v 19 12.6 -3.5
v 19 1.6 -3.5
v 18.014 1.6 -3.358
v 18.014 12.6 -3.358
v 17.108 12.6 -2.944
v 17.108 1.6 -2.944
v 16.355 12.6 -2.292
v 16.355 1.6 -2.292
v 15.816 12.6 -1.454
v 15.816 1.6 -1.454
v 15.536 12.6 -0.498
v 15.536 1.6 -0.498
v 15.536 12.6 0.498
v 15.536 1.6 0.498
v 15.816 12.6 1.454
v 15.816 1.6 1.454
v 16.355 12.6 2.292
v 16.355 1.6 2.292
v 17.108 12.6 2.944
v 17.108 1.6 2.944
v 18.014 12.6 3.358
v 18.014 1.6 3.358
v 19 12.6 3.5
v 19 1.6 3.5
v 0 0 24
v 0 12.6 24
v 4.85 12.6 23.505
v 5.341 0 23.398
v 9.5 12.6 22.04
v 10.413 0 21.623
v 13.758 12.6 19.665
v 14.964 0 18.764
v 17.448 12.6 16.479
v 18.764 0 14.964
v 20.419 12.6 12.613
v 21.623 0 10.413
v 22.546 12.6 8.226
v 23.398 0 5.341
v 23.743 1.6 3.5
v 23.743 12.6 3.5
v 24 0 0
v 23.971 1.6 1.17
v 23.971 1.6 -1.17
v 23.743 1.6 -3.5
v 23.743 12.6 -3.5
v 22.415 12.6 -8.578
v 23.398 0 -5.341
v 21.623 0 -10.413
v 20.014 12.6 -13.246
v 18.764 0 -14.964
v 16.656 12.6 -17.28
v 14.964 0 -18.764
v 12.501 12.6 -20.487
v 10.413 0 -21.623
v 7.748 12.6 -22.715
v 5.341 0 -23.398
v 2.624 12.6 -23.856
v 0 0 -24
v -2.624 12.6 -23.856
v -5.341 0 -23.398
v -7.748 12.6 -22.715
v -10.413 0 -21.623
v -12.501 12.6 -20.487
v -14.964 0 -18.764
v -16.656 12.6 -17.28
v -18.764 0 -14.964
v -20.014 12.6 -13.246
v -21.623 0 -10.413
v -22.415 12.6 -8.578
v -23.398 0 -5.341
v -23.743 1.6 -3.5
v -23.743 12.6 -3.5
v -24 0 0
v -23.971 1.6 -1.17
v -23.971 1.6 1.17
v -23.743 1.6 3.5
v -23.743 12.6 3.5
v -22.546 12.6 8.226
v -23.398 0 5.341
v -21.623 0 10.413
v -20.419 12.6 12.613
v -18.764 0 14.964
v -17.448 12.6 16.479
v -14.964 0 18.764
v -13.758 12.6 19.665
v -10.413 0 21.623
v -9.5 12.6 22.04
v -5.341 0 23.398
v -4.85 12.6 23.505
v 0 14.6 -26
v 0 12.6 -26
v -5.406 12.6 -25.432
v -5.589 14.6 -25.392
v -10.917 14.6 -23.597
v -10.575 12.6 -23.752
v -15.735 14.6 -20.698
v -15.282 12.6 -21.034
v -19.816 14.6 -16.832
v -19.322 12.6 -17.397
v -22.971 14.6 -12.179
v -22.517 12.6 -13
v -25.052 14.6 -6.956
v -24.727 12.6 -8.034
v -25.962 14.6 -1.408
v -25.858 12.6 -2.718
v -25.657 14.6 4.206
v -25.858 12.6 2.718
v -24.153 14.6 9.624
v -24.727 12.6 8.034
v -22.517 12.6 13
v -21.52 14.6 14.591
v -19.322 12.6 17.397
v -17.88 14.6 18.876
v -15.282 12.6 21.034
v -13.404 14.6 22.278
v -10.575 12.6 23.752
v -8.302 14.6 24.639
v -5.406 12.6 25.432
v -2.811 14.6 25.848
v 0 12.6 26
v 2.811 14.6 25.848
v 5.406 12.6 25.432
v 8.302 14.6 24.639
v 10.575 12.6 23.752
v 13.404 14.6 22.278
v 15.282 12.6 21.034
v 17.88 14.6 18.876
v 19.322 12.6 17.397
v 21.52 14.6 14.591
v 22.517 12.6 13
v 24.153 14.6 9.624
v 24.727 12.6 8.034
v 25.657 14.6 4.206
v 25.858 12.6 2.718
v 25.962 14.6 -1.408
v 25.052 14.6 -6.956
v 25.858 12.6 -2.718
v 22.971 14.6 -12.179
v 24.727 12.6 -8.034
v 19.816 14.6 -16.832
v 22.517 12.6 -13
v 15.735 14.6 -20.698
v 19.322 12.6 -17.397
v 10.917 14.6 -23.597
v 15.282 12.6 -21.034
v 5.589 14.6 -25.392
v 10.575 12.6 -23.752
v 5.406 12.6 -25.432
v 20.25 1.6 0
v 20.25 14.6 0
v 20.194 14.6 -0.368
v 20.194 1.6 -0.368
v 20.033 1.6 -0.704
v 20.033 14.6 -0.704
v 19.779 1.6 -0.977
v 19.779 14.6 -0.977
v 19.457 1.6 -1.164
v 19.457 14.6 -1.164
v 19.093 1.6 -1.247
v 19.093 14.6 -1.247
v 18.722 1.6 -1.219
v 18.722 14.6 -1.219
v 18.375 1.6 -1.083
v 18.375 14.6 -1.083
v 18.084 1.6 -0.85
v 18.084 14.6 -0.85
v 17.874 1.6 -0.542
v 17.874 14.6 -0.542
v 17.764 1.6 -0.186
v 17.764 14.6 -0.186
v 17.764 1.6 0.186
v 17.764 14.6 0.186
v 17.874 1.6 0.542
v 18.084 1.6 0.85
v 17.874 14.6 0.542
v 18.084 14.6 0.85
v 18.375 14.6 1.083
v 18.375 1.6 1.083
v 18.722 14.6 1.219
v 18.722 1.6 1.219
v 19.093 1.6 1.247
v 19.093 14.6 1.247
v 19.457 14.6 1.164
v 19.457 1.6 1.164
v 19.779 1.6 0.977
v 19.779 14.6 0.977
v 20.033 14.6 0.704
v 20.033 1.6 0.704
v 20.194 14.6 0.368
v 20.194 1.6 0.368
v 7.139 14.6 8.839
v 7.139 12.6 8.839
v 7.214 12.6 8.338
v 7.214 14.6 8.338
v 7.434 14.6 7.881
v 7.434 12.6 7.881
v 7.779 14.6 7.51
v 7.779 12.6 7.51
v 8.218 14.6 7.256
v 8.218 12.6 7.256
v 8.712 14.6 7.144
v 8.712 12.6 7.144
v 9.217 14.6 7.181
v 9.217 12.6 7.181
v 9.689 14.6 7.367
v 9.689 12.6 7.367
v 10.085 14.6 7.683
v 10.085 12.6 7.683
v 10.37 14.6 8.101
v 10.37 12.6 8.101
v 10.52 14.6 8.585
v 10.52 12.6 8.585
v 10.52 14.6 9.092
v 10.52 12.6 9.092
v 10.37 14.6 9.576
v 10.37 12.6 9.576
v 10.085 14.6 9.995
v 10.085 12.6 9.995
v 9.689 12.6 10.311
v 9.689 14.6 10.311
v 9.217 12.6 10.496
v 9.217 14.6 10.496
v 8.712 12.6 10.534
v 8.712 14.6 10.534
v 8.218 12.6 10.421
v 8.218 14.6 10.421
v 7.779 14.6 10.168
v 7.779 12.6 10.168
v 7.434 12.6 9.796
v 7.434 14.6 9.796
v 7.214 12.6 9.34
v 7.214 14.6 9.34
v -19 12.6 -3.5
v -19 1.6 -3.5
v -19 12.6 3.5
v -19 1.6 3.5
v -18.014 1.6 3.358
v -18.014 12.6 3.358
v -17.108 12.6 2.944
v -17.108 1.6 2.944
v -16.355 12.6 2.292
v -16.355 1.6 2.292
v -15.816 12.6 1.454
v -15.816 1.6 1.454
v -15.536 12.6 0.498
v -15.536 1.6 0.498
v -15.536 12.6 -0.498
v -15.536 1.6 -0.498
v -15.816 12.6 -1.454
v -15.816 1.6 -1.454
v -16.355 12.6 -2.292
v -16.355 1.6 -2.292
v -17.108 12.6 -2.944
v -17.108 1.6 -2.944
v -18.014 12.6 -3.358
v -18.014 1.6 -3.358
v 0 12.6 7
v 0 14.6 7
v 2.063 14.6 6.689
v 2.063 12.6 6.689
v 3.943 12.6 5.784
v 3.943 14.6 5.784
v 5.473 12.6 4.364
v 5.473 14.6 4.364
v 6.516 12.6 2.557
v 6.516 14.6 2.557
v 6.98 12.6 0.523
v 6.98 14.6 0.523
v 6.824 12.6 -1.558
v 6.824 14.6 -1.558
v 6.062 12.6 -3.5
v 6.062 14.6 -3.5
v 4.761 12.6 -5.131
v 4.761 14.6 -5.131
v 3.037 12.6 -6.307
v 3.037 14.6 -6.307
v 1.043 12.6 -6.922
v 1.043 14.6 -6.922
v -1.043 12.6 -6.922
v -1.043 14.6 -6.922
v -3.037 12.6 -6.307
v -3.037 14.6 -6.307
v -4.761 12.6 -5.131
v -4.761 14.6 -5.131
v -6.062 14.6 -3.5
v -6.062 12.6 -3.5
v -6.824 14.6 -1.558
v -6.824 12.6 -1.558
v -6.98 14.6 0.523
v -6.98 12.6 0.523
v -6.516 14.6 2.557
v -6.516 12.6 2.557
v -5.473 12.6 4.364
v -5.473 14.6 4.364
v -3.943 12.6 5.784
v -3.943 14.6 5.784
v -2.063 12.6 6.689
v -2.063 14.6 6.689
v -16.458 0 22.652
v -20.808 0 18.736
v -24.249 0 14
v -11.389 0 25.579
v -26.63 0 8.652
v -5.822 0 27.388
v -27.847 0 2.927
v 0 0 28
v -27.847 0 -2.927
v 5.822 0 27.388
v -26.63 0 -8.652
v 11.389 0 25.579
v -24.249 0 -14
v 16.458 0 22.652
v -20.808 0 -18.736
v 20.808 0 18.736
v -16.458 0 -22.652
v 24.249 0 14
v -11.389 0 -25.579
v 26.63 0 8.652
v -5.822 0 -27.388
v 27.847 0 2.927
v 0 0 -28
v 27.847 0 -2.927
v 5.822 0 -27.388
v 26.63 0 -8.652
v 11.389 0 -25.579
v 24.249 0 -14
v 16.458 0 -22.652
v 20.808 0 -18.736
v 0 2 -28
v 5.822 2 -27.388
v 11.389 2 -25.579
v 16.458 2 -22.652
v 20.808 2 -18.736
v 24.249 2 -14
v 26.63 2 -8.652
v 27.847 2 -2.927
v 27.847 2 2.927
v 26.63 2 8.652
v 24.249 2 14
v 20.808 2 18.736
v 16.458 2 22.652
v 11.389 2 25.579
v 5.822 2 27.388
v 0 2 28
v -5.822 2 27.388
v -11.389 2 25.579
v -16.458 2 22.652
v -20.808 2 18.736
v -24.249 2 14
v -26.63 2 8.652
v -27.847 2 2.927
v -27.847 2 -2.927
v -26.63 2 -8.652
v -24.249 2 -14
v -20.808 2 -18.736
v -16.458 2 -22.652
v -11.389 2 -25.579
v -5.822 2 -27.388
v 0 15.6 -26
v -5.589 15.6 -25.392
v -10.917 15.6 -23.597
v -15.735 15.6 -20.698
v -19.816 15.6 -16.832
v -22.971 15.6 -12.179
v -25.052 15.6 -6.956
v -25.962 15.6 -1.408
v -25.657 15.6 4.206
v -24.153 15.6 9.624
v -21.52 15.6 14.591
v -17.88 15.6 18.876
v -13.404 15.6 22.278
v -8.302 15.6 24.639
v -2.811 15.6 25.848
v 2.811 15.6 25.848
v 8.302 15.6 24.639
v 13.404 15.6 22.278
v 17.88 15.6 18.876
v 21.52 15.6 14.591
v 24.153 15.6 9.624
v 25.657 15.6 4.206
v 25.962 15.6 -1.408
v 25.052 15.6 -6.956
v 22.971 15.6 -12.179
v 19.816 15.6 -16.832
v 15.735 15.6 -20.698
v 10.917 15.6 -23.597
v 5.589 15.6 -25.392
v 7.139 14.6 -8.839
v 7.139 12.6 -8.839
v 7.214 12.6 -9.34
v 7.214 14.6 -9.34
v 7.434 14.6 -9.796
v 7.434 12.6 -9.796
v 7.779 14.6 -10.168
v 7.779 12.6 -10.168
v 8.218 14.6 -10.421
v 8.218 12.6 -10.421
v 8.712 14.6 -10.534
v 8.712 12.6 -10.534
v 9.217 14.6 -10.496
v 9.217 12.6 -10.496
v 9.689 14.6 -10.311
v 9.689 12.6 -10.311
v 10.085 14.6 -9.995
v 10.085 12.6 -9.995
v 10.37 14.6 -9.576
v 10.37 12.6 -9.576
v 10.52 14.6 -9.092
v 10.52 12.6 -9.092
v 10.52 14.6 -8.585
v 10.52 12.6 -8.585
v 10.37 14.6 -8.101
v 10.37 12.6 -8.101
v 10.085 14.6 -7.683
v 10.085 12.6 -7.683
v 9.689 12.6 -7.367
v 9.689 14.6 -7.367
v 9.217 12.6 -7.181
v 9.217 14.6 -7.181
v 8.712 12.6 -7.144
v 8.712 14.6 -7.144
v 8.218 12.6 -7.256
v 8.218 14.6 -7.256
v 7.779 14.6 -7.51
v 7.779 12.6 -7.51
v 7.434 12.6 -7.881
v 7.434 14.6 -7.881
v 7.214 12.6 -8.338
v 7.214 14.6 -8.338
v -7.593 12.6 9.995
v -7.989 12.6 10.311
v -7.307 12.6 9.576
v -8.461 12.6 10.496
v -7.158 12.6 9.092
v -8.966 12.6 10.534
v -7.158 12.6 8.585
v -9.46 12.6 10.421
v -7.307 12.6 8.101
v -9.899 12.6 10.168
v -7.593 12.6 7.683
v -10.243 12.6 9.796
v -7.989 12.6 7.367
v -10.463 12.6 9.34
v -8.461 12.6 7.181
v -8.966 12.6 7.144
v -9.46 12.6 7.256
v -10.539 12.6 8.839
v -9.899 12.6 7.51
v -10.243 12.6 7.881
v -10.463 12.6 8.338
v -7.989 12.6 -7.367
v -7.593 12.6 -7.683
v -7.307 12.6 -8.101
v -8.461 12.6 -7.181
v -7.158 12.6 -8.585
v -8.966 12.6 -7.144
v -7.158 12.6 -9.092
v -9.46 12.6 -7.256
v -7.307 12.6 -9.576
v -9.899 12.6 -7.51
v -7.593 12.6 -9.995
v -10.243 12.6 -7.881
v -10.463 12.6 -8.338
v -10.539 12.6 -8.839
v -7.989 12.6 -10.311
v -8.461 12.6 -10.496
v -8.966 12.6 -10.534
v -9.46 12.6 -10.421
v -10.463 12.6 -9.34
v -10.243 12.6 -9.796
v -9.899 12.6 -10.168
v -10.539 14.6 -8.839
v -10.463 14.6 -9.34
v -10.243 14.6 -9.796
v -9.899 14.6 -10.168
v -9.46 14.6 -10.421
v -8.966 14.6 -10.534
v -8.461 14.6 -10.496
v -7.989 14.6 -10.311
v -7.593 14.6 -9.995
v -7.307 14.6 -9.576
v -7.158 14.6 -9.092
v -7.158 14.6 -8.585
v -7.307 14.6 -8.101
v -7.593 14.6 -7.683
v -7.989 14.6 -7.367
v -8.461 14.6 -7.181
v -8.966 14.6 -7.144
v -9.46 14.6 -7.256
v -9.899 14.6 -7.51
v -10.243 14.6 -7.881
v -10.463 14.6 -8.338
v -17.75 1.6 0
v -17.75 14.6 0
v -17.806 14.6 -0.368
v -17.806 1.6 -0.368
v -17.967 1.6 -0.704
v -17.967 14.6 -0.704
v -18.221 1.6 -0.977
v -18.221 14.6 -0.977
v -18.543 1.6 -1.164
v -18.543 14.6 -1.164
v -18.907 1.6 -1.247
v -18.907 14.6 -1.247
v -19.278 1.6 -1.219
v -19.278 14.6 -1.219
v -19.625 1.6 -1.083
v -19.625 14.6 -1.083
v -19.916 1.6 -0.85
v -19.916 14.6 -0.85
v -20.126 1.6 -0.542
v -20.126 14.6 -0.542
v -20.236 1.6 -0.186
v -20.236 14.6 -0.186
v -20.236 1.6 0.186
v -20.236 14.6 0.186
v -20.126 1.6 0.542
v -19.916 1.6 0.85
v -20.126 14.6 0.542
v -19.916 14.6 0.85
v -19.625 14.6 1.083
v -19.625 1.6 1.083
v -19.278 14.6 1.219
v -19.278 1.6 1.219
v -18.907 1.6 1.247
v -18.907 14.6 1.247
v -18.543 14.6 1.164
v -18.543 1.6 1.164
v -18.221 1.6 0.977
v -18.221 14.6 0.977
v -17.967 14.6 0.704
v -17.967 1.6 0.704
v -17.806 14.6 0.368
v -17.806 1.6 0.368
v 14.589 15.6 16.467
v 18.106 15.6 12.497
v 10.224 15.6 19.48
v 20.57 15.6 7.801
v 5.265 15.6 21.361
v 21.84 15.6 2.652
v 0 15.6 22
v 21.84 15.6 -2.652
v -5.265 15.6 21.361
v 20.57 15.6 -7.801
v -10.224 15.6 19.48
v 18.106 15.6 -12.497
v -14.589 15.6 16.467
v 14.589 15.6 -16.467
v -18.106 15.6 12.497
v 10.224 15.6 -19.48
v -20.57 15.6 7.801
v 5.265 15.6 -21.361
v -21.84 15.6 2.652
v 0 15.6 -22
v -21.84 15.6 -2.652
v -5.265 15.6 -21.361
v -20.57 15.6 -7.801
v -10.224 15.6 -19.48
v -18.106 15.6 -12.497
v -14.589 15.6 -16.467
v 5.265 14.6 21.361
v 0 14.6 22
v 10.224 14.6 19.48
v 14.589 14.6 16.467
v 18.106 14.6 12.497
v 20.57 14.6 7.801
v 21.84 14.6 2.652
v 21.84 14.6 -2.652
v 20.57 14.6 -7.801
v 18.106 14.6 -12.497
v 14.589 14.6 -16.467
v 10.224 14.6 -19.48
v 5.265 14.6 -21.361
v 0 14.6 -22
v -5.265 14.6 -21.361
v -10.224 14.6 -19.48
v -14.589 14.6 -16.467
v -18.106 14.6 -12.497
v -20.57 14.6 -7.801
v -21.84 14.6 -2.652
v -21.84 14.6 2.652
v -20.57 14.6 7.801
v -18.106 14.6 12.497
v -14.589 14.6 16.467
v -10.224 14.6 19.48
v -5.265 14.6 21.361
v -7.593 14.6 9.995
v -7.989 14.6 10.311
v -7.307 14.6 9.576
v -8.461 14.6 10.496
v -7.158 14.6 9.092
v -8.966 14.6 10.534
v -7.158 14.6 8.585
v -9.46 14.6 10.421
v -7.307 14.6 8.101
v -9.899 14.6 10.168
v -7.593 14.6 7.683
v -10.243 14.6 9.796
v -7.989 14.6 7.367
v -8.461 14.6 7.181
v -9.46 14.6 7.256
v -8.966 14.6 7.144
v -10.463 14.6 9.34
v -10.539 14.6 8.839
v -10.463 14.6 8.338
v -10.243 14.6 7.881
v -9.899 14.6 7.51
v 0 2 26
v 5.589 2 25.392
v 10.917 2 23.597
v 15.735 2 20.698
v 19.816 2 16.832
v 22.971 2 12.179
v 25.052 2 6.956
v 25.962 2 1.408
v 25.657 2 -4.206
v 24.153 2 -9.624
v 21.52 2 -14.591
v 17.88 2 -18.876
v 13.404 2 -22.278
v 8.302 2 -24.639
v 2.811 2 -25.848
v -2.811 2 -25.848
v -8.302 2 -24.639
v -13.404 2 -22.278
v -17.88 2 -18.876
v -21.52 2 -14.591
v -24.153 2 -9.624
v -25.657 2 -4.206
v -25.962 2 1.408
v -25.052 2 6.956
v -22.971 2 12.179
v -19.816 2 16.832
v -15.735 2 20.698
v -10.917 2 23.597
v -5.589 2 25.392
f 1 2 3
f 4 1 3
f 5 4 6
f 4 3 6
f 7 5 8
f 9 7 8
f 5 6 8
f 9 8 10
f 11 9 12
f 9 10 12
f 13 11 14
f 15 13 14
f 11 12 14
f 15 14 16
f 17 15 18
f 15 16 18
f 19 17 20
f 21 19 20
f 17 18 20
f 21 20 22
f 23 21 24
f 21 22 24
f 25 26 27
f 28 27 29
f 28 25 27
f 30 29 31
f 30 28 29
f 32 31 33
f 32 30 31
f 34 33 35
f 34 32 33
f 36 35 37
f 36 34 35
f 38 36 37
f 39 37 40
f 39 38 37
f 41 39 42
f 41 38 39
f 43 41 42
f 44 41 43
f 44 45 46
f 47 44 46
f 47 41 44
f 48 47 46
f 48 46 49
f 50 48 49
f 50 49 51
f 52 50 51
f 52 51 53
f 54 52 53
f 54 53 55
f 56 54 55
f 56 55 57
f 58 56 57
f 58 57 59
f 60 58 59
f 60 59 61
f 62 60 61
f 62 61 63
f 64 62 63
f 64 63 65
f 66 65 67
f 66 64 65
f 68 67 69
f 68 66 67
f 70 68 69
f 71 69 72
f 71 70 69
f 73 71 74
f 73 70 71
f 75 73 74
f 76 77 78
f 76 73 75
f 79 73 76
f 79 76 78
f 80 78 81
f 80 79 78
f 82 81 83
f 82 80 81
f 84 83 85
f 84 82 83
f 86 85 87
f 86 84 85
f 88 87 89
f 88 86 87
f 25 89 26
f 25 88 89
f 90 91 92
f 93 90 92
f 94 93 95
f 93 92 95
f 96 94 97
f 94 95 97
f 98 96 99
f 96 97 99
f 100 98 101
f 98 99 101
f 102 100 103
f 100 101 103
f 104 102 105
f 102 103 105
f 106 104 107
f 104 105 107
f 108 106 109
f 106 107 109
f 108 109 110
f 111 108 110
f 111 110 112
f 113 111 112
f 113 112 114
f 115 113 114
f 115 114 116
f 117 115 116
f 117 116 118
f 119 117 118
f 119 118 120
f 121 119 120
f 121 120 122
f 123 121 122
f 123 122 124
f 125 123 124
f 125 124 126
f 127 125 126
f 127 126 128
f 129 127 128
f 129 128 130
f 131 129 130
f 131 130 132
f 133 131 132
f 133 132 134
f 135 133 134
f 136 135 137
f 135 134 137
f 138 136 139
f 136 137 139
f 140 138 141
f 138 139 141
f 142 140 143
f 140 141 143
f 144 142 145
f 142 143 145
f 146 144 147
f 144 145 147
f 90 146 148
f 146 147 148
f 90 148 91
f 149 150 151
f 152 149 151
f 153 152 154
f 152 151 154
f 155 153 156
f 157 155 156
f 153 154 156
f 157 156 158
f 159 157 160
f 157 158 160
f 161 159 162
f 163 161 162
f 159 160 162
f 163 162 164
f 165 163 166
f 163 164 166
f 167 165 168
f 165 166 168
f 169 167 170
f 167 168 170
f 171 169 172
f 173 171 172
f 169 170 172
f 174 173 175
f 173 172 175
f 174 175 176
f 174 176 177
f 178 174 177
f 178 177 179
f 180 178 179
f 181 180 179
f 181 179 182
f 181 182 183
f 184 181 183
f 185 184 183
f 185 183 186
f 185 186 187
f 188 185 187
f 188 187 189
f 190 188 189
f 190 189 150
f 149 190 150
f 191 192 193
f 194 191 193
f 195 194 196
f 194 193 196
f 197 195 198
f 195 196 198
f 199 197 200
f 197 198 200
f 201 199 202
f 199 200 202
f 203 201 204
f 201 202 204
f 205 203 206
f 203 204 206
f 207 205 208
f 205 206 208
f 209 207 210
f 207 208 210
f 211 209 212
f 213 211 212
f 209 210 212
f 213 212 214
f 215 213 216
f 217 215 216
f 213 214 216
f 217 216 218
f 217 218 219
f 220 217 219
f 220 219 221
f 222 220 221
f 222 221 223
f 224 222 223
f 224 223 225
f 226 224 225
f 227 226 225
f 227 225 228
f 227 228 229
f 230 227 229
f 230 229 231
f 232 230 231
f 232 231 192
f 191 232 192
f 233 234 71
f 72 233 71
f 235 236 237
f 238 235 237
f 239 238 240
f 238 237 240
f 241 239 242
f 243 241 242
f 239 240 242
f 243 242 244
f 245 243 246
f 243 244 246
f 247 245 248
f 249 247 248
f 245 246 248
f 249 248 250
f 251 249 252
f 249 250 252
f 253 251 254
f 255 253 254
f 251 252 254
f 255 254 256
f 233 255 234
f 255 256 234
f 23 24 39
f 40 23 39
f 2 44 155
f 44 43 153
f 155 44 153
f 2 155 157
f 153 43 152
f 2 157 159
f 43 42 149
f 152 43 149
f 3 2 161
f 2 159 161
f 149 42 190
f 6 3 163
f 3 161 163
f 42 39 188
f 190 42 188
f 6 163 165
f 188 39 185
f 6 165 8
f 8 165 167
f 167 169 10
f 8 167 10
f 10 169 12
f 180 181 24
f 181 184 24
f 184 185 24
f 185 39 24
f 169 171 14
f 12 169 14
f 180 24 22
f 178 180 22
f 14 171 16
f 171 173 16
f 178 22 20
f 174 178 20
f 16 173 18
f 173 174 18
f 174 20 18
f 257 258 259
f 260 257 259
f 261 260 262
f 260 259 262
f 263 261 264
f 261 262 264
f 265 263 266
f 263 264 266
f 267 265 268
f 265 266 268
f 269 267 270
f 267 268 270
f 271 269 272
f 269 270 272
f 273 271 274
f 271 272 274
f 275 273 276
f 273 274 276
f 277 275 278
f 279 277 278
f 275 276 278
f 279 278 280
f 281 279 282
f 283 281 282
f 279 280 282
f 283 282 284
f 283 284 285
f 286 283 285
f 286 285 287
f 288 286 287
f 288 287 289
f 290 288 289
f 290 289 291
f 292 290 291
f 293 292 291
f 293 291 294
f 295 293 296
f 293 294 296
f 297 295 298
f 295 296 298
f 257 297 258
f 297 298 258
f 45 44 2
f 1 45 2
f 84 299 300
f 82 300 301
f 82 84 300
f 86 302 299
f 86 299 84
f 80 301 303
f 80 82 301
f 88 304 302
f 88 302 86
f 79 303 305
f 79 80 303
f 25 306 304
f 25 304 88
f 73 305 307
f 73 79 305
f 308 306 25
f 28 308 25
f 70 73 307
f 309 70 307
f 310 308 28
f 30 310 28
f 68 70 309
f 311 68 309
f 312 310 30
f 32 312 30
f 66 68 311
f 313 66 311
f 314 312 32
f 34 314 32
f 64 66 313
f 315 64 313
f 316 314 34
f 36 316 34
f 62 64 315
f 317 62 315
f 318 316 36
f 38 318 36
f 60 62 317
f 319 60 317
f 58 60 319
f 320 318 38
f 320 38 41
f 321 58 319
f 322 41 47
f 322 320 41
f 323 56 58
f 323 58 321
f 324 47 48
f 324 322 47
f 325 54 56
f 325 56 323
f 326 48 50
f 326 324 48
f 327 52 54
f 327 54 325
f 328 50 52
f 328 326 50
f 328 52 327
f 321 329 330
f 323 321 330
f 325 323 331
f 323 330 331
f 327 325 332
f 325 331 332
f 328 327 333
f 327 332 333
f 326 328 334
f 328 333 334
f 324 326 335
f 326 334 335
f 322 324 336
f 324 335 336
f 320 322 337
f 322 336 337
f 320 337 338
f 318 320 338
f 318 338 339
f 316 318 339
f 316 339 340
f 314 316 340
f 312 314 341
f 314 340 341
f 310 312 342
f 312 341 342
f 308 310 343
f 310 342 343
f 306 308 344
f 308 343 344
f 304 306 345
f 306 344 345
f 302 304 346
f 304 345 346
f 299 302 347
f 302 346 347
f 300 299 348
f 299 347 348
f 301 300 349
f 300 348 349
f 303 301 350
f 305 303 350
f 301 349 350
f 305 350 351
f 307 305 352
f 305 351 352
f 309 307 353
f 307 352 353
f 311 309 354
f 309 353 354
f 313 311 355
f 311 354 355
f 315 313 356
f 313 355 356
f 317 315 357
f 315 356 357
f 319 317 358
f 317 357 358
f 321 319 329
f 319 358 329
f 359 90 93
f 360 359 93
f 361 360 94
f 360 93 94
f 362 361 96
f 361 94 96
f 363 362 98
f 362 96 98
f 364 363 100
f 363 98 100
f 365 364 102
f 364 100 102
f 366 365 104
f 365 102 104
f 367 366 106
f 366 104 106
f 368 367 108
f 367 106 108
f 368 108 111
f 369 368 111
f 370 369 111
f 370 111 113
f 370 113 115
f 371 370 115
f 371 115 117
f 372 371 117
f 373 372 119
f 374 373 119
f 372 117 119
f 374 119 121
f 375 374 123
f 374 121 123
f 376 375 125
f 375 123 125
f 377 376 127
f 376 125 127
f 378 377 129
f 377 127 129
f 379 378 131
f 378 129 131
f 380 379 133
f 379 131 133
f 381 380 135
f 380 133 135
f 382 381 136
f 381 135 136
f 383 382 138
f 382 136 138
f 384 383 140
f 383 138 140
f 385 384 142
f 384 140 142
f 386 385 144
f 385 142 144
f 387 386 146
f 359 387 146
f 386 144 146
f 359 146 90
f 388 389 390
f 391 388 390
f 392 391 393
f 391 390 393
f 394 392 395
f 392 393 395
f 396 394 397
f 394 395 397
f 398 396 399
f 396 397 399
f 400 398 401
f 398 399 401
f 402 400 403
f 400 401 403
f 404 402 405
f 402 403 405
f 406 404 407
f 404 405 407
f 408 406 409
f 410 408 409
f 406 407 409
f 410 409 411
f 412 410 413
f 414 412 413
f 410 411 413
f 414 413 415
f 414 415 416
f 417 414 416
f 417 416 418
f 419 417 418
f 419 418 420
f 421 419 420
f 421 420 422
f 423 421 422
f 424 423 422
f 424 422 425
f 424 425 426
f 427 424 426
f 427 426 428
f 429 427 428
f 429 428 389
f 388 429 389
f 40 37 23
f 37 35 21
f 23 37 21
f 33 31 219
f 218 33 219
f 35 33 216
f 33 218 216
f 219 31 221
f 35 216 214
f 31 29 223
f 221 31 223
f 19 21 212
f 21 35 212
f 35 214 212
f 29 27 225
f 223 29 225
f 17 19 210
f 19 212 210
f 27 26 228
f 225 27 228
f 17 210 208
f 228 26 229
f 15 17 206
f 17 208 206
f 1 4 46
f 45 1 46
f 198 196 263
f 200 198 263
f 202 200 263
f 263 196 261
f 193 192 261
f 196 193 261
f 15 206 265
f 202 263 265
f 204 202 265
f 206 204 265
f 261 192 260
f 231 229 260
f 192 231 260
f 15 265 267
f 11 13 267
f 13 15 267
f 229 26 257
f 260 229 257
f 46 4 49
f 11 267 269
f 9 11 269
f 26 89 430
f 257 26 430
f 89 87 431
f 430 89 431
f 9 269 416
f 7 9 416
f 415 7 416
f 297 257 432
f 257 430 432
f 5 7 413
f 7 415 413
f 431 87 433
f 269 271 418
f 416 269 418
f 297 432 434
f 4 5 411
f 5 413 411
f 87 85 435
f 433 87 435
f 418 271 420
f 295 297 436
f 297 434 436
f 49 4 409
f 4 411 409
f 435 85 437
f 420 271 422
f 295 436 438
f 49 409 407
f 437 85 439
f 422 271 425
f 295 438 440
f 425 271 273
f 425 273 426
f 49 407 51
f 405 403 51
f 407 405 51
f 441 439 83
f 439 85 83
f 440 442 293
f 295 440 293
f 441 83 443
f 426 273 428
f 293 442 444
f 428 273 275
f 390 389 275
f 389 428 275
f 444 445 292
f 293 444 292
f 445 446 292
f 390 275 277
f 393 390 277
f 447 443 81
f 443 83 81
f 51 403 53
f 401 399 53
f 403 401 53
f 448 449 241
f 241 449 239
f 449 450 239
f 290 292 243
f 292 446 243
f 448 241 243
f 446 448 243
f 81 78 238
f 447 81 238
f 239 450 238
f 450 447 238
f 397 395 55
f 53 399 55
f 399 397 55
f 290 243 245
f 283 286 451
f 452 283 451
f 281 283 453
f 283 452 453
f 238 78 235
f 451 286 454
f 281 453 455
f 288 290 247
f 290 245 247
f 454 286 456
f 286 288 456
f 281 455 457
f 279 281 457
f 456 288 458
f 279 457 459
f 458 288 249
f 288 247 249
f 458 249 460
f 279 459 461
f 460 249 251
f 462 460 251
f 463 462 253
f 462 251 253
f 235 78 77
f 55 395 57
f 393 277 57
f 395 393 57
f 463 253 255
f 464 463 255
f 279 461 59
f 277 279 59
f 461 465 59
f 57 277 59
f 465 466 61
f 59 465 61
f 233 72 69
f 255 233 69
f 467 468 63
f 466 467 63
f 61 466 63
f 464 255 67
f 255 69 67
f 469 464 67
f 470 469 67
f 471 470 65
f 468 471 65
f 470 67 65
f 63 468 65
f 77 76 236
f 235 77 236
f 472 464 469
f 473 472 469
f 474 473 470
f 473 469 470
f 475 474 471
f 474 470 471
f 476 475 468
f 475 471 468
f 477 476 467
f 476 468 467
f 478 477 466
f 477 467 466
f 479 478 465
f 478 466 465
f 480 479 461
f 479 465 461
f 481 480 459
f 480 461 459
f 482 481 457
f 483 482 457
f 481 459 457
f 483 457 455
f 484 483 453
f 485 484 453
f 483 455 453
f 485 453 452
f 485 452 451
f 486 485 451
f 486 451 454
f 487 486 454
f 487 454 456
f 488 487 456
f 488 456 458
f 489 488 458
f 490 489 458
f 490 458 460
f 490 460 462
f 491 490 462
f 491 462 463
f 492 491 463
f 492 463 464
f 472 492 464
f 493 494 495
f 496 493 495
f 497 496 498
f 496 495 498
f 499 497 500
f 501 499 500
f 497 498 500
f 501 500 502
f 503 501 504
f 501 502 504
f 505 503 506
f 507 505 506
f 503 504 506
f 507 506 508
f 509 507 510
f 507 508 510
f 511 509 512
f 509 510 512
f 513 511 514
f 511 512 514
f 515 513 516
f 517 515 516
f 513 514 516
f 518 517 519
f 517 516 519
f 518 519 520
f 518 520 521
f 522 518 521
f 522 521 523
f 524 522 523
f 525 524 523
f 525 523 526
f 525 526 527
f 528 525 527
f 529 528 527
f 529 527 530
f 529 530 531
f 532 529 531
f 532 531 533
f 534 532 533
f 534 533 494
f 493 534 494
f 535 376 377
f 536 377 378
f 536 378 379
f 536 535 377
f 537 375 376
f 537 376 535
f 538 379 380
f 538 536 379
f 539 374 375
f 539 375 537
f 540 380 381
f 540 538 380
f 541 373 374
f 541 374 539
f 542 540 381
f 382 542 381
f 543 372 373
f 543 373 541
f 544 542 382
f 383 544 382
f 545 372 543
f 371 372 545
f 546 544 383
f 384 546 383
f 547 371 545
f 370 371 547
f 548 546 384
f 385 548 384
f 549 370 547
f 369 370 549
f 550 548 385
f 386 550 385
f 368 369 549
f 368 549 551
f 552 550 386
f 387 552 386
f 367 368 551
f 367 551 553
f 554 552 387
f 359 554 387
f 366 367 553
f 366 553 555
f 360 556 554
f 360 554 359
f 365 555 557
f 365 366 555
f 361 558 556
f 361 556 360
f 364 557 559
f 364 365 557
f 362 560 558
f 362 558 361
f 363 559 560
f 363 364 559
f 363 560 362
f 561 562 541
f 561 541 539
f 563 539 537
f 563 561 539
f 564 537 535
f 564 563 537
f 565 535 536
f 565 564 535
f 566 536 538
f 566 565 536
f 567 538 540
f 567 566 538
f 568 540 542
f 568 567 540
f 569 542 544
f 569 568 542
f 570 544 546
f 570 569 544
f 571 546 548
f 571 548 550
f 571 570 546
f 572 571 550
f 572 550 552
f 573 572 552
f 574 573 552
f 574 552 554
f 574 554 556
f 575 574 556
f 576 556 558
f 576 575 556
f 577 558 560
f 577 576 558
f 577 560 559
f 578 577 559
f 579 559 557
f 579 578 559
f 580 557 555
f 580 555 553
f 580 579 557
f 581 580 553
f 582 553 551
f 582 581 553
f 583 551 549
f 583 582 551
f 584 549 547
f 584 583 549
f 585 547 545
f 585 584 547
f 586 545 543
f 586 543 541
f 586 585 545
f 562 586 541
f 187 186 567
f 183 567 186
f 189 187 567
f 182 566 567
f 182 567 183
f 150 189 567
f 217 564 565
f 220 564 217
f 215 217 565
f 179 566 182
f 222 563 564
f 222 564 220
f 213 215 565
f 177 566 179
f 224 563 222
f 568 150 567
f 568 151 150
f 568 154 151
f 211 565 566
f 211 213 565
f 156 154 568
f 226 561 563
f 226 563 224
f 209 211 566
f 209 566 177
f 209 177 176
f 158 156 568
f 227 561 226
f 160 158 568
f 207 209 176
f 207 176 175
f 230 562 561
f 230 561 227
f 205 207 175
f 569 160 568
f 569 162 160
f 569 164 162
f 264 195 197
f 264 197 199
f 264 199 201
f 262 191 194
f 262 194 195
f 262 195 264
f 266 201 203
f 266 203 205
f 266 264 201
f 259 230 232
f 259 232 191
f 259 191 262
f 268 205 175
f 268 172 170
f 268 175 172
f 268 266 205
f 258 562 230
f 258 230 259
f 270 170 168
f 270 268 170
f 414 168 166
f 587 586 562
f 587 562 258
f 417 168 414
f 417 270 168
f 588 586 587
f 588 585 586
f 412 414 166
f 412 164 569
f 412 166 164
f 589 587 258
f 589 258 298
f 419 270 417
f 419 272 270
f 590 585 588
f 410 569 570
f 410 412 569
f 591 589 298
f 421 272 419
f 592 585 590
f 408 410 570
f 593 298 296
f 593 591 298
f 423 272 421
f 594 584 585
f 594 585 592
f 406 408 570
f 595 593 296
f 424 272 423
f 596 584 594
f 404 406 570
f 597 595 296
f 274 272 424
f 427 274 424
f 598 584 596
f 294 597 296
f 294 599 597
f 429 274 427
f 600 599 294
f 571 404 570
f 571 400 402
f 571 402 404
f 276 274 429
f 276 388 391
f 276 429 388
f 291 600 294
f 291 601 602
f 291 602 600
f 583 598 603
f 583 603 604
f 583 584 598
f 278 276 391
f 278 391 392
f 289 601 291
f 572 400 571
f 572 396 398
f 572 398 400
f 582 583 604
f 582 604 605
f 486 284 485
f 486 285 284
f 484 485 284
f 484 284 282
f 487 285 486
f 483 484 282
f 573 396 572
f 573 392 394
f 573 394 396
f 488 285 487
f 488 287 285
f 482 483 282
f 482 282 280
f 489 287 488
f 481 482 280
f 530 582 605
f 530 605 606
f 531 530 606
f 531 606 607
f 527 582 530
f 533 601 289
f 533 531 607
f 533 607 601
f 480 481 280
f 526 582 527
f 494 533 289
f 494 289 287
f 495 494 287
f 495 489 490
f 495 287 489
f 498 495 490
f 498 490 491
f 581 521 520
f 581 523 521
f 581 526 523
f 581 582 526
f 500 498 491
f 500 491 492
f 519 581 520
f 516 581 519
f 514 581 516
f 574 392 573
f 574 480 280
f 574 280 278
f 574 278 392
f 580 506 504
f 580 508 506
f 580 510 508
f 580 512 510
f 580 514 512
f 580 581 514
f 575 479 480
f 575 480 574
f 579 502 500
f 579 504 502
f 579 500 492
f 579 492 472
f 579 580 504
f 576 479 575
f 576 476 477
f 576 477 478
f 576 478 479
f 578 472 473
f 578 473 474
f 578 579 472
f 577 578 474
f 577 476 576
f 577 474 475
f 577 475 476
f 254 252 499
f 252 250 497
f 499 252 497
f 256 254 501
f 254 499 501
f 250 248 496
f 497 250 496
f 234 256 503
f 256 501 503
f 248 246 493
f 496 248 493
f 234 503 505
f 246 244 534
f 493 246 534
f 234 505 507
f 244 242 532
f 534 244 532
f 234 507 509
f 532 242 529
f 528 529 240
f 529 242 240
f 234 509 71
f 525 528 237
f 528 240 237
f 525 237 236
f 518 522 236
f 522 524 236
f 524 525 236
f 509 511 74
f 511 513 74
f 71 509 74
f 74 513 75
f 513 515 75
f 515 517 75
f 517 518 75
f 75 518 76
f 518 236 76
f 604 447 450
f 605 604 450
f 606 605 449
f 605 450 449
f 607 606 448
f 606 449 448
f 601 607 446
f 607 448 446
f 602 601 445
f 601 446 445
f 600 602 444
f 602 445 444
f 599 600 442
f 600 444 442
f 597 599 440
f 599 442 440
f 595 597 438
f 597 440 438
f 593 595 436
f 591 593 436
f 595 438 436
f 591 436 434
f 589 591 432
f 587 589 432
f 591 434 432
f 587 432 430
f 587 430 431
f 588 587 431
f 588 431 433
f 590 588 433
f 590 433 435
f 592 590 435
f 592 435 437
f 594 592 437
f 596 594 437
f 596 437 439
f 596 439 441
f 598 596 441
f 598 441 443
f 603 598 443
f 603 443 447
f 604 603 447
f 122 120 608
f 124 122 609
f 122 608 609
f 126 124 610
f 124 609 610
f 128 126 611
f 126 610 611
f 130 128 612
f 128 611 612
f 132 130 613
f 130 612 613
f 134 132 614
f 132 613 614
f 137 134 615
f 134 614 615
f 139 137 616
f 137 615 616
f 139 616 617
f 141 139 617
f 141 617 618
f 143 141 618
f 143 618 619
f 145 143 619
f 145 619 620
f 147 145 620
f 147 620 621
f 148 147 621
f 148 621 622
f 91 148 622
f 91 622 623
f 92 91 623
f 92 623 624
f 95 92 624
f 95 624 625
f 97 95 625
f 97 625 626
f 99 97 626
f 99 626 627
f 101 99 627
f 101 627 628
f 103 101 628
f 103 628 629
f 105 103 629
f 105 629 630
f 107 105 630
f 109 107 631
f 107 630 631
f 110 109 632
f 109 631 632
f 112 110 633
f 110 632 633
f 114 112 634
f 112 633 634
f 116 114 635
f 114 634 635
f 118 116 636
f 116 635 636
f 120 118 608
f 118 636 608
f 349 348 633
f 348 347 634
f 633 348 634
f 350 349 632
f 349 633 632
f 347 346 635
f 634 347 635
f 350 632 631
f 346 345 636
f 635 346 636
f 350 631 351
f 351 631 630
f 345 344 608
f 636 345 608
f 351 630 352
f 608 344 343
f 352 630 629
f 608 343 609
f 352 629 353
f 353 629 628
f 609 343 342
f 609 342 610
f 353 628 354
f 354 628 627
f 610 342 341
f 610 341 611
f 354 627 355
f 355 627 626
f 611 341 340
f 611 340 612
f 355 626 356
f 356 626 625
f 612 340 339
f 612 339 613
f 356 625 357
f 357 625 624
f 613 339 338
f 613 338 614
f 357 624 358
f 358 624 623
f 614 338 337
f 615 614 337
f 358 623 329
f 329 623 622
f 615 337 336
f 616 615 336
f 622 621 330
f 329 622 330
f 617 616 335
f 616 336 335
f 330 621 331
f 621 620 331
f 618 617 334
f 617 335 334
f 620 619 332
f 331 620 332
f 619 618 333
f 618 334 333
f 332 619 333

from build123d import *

# Parameters (mm, degrees)
SKETCH_1_R          = 26
SKETCH_1_R_2        = 24
EXTRUDE_1_DEPTH     = 12.6
EXTRUDE_START       = -2
SKETCH_2_R          = 28
SKETCH_2_R_2        = 26
EXTRUDE_2_DEPTH     = 2
SKETCH_3_R          = 26
EXTRUDE_3_DEPTH     = 2
SKETCH_4_R          = 26
SKETCH_4_R_2        = 22
EXTRUDE_4_DEPTH     = 1
EXTRUDE_START_2     = 11
EXTRUDE_5_DEPTH     = 11
M3X0_51_D           = 2.5
SKETCH_8_R          = 7
CUT_EXTRUDE_1_DEPTH = 2
HOLE_WIZARD_M31_D   = 3.4


with BuildPart() as part:
    # Эскиз1 → Бобышка-Вытянуть1 (new body)
    with BuildSketch(Plane(origin=(0, 0, 0), x_dir=(1, 0, 0), z_dir=(0, 1, 0))):
        with Locations(Location((0, 0, 0), (0, 0, 270))):
            Circle(SKETCH_1_R)
        with Locations(Location((0, 0, 0), (0, 0, 270))):
            Circle(SKETCH_1_R_2, mode=Mode.SUBTRACT)
    extrude(amount=EXTRUDE_1_DEPTH)

    # Эскиз2 → Бобышка-Вытянуть2 (add)
    with BuildSketch(Plane.XZ.offset(EXTRUDE_START)):
        with Locations(Location((0, 0, 0), (0, 0, 270))):
            Circle(SKETCH_2_R)
        with Locations(Location((0, 0, 0), (0, 0, 270))):
            Circle(SKETCH_2_R_2, mode=Mode.SUBTRACT)
    extrude(amount=EXTRUDE_2_DEPTH)

    # Эскиз3 → Бобышка-Вытянуть3 (add)
    with BuildSketch(Plane(origin=(0, 12.6, 0), x_dir=(1, 0, 0), z_dir=(0, 1, 0))):
        with Locations(Location((0, 0, 0), (0, 0, 90))):
            Circle(SKETCH_3_R)
    extrude(amount=EXTRUDE_3_DEPTH)

    # Эскиз4 → Бобышка-Вытянуть4 (add)
    with BuildSketch(Plane(origin=(0, 14.6, 0), x_dir=(1, 0, 0), z_dir=(0, 1, 0))):
        with Locations(Location((0, 0, 0), (0, 0, 90))):
            Circle(SKETCH_4_R)
        with Locations(Location((0, 0, 0), (0, 0, 270))):
            Circle(SKETCH_4_R_2, mode=Mode.SUBTRACT)
    extrude(amount=EXTRUDE_4_DEPTH)

    # Эскиз5 → Бобышка-Вытянуть5 (add)
    with BuildSketch(Plane.XZ.offset(-12.6).offset(EXTRUDE_START_2)):
        with BuildLine():
            Line((19, 3.5), (23.743420141, 3.5))
            ThreePointArc((23.743420141, 3.5), (24, 0), (23.743420141, -3.5))
            Line((23.743420141, -3.5), (19, -3.5))
            ThreePointArc((19, -3.5), (15.5, 0), (19, 3.5))
        make_face()
        with BuildLine():
            Line((-19, -3.5), (-23.743420141, -3.5))
            ThreePointArc((-23.743420141, -3.5), (-24, 0), (-23.743420141, 3.5))
            Line((-23.743420141, 3.5), (-19, 3.5))
            ThreePointArc((-19, 3.5), (-15.5, 0), (-19, -3.5))
        make_face()
    extrude(amount=-EXTRUDE_5_DEPTH)

    # Отверстие обработанное метчиком M3x0.51 (through all)
    with Locations(Plane(origin=(0, 1.6, 0), x_dir=(-1, 0, 0), z_dir=(0, -1, 0))):
        with Locations((-19, 0), (19, 0)):
            Hole(M3X0_51_D / 2)

    # Эскиз8 → Вырез-Вытянуть1 (cut)
    with BuildSketch(Plane(origin=(0, 14.6, 0), x_dir=(1, 0, 0), z_dir=(0, 1, 0))):
        with Locations(Location((0, 0, 0), (0, 0, 270))):
            Circle(SKETCH_8_R)
    extrude(amount=-CUT_EXTRUDE_1_DEPTH, mode=Mode.SUBTRACT)

    # Отверстие с зазором M31 (through all)
    with Locations(Plane(origin=(0, 14.6, 0), x_dir=(1, 0, 0), z_dir=(0, 1, 0))):
        with Locations((-8.838834765, 8.838834765), (8.838834765, 8.838834765), (8.838834765, -8.838834765), (-8.838834765, -8.838834765)):
            Hole(HOLE_WIZARD_M31_D / 2)


solid = part.part
